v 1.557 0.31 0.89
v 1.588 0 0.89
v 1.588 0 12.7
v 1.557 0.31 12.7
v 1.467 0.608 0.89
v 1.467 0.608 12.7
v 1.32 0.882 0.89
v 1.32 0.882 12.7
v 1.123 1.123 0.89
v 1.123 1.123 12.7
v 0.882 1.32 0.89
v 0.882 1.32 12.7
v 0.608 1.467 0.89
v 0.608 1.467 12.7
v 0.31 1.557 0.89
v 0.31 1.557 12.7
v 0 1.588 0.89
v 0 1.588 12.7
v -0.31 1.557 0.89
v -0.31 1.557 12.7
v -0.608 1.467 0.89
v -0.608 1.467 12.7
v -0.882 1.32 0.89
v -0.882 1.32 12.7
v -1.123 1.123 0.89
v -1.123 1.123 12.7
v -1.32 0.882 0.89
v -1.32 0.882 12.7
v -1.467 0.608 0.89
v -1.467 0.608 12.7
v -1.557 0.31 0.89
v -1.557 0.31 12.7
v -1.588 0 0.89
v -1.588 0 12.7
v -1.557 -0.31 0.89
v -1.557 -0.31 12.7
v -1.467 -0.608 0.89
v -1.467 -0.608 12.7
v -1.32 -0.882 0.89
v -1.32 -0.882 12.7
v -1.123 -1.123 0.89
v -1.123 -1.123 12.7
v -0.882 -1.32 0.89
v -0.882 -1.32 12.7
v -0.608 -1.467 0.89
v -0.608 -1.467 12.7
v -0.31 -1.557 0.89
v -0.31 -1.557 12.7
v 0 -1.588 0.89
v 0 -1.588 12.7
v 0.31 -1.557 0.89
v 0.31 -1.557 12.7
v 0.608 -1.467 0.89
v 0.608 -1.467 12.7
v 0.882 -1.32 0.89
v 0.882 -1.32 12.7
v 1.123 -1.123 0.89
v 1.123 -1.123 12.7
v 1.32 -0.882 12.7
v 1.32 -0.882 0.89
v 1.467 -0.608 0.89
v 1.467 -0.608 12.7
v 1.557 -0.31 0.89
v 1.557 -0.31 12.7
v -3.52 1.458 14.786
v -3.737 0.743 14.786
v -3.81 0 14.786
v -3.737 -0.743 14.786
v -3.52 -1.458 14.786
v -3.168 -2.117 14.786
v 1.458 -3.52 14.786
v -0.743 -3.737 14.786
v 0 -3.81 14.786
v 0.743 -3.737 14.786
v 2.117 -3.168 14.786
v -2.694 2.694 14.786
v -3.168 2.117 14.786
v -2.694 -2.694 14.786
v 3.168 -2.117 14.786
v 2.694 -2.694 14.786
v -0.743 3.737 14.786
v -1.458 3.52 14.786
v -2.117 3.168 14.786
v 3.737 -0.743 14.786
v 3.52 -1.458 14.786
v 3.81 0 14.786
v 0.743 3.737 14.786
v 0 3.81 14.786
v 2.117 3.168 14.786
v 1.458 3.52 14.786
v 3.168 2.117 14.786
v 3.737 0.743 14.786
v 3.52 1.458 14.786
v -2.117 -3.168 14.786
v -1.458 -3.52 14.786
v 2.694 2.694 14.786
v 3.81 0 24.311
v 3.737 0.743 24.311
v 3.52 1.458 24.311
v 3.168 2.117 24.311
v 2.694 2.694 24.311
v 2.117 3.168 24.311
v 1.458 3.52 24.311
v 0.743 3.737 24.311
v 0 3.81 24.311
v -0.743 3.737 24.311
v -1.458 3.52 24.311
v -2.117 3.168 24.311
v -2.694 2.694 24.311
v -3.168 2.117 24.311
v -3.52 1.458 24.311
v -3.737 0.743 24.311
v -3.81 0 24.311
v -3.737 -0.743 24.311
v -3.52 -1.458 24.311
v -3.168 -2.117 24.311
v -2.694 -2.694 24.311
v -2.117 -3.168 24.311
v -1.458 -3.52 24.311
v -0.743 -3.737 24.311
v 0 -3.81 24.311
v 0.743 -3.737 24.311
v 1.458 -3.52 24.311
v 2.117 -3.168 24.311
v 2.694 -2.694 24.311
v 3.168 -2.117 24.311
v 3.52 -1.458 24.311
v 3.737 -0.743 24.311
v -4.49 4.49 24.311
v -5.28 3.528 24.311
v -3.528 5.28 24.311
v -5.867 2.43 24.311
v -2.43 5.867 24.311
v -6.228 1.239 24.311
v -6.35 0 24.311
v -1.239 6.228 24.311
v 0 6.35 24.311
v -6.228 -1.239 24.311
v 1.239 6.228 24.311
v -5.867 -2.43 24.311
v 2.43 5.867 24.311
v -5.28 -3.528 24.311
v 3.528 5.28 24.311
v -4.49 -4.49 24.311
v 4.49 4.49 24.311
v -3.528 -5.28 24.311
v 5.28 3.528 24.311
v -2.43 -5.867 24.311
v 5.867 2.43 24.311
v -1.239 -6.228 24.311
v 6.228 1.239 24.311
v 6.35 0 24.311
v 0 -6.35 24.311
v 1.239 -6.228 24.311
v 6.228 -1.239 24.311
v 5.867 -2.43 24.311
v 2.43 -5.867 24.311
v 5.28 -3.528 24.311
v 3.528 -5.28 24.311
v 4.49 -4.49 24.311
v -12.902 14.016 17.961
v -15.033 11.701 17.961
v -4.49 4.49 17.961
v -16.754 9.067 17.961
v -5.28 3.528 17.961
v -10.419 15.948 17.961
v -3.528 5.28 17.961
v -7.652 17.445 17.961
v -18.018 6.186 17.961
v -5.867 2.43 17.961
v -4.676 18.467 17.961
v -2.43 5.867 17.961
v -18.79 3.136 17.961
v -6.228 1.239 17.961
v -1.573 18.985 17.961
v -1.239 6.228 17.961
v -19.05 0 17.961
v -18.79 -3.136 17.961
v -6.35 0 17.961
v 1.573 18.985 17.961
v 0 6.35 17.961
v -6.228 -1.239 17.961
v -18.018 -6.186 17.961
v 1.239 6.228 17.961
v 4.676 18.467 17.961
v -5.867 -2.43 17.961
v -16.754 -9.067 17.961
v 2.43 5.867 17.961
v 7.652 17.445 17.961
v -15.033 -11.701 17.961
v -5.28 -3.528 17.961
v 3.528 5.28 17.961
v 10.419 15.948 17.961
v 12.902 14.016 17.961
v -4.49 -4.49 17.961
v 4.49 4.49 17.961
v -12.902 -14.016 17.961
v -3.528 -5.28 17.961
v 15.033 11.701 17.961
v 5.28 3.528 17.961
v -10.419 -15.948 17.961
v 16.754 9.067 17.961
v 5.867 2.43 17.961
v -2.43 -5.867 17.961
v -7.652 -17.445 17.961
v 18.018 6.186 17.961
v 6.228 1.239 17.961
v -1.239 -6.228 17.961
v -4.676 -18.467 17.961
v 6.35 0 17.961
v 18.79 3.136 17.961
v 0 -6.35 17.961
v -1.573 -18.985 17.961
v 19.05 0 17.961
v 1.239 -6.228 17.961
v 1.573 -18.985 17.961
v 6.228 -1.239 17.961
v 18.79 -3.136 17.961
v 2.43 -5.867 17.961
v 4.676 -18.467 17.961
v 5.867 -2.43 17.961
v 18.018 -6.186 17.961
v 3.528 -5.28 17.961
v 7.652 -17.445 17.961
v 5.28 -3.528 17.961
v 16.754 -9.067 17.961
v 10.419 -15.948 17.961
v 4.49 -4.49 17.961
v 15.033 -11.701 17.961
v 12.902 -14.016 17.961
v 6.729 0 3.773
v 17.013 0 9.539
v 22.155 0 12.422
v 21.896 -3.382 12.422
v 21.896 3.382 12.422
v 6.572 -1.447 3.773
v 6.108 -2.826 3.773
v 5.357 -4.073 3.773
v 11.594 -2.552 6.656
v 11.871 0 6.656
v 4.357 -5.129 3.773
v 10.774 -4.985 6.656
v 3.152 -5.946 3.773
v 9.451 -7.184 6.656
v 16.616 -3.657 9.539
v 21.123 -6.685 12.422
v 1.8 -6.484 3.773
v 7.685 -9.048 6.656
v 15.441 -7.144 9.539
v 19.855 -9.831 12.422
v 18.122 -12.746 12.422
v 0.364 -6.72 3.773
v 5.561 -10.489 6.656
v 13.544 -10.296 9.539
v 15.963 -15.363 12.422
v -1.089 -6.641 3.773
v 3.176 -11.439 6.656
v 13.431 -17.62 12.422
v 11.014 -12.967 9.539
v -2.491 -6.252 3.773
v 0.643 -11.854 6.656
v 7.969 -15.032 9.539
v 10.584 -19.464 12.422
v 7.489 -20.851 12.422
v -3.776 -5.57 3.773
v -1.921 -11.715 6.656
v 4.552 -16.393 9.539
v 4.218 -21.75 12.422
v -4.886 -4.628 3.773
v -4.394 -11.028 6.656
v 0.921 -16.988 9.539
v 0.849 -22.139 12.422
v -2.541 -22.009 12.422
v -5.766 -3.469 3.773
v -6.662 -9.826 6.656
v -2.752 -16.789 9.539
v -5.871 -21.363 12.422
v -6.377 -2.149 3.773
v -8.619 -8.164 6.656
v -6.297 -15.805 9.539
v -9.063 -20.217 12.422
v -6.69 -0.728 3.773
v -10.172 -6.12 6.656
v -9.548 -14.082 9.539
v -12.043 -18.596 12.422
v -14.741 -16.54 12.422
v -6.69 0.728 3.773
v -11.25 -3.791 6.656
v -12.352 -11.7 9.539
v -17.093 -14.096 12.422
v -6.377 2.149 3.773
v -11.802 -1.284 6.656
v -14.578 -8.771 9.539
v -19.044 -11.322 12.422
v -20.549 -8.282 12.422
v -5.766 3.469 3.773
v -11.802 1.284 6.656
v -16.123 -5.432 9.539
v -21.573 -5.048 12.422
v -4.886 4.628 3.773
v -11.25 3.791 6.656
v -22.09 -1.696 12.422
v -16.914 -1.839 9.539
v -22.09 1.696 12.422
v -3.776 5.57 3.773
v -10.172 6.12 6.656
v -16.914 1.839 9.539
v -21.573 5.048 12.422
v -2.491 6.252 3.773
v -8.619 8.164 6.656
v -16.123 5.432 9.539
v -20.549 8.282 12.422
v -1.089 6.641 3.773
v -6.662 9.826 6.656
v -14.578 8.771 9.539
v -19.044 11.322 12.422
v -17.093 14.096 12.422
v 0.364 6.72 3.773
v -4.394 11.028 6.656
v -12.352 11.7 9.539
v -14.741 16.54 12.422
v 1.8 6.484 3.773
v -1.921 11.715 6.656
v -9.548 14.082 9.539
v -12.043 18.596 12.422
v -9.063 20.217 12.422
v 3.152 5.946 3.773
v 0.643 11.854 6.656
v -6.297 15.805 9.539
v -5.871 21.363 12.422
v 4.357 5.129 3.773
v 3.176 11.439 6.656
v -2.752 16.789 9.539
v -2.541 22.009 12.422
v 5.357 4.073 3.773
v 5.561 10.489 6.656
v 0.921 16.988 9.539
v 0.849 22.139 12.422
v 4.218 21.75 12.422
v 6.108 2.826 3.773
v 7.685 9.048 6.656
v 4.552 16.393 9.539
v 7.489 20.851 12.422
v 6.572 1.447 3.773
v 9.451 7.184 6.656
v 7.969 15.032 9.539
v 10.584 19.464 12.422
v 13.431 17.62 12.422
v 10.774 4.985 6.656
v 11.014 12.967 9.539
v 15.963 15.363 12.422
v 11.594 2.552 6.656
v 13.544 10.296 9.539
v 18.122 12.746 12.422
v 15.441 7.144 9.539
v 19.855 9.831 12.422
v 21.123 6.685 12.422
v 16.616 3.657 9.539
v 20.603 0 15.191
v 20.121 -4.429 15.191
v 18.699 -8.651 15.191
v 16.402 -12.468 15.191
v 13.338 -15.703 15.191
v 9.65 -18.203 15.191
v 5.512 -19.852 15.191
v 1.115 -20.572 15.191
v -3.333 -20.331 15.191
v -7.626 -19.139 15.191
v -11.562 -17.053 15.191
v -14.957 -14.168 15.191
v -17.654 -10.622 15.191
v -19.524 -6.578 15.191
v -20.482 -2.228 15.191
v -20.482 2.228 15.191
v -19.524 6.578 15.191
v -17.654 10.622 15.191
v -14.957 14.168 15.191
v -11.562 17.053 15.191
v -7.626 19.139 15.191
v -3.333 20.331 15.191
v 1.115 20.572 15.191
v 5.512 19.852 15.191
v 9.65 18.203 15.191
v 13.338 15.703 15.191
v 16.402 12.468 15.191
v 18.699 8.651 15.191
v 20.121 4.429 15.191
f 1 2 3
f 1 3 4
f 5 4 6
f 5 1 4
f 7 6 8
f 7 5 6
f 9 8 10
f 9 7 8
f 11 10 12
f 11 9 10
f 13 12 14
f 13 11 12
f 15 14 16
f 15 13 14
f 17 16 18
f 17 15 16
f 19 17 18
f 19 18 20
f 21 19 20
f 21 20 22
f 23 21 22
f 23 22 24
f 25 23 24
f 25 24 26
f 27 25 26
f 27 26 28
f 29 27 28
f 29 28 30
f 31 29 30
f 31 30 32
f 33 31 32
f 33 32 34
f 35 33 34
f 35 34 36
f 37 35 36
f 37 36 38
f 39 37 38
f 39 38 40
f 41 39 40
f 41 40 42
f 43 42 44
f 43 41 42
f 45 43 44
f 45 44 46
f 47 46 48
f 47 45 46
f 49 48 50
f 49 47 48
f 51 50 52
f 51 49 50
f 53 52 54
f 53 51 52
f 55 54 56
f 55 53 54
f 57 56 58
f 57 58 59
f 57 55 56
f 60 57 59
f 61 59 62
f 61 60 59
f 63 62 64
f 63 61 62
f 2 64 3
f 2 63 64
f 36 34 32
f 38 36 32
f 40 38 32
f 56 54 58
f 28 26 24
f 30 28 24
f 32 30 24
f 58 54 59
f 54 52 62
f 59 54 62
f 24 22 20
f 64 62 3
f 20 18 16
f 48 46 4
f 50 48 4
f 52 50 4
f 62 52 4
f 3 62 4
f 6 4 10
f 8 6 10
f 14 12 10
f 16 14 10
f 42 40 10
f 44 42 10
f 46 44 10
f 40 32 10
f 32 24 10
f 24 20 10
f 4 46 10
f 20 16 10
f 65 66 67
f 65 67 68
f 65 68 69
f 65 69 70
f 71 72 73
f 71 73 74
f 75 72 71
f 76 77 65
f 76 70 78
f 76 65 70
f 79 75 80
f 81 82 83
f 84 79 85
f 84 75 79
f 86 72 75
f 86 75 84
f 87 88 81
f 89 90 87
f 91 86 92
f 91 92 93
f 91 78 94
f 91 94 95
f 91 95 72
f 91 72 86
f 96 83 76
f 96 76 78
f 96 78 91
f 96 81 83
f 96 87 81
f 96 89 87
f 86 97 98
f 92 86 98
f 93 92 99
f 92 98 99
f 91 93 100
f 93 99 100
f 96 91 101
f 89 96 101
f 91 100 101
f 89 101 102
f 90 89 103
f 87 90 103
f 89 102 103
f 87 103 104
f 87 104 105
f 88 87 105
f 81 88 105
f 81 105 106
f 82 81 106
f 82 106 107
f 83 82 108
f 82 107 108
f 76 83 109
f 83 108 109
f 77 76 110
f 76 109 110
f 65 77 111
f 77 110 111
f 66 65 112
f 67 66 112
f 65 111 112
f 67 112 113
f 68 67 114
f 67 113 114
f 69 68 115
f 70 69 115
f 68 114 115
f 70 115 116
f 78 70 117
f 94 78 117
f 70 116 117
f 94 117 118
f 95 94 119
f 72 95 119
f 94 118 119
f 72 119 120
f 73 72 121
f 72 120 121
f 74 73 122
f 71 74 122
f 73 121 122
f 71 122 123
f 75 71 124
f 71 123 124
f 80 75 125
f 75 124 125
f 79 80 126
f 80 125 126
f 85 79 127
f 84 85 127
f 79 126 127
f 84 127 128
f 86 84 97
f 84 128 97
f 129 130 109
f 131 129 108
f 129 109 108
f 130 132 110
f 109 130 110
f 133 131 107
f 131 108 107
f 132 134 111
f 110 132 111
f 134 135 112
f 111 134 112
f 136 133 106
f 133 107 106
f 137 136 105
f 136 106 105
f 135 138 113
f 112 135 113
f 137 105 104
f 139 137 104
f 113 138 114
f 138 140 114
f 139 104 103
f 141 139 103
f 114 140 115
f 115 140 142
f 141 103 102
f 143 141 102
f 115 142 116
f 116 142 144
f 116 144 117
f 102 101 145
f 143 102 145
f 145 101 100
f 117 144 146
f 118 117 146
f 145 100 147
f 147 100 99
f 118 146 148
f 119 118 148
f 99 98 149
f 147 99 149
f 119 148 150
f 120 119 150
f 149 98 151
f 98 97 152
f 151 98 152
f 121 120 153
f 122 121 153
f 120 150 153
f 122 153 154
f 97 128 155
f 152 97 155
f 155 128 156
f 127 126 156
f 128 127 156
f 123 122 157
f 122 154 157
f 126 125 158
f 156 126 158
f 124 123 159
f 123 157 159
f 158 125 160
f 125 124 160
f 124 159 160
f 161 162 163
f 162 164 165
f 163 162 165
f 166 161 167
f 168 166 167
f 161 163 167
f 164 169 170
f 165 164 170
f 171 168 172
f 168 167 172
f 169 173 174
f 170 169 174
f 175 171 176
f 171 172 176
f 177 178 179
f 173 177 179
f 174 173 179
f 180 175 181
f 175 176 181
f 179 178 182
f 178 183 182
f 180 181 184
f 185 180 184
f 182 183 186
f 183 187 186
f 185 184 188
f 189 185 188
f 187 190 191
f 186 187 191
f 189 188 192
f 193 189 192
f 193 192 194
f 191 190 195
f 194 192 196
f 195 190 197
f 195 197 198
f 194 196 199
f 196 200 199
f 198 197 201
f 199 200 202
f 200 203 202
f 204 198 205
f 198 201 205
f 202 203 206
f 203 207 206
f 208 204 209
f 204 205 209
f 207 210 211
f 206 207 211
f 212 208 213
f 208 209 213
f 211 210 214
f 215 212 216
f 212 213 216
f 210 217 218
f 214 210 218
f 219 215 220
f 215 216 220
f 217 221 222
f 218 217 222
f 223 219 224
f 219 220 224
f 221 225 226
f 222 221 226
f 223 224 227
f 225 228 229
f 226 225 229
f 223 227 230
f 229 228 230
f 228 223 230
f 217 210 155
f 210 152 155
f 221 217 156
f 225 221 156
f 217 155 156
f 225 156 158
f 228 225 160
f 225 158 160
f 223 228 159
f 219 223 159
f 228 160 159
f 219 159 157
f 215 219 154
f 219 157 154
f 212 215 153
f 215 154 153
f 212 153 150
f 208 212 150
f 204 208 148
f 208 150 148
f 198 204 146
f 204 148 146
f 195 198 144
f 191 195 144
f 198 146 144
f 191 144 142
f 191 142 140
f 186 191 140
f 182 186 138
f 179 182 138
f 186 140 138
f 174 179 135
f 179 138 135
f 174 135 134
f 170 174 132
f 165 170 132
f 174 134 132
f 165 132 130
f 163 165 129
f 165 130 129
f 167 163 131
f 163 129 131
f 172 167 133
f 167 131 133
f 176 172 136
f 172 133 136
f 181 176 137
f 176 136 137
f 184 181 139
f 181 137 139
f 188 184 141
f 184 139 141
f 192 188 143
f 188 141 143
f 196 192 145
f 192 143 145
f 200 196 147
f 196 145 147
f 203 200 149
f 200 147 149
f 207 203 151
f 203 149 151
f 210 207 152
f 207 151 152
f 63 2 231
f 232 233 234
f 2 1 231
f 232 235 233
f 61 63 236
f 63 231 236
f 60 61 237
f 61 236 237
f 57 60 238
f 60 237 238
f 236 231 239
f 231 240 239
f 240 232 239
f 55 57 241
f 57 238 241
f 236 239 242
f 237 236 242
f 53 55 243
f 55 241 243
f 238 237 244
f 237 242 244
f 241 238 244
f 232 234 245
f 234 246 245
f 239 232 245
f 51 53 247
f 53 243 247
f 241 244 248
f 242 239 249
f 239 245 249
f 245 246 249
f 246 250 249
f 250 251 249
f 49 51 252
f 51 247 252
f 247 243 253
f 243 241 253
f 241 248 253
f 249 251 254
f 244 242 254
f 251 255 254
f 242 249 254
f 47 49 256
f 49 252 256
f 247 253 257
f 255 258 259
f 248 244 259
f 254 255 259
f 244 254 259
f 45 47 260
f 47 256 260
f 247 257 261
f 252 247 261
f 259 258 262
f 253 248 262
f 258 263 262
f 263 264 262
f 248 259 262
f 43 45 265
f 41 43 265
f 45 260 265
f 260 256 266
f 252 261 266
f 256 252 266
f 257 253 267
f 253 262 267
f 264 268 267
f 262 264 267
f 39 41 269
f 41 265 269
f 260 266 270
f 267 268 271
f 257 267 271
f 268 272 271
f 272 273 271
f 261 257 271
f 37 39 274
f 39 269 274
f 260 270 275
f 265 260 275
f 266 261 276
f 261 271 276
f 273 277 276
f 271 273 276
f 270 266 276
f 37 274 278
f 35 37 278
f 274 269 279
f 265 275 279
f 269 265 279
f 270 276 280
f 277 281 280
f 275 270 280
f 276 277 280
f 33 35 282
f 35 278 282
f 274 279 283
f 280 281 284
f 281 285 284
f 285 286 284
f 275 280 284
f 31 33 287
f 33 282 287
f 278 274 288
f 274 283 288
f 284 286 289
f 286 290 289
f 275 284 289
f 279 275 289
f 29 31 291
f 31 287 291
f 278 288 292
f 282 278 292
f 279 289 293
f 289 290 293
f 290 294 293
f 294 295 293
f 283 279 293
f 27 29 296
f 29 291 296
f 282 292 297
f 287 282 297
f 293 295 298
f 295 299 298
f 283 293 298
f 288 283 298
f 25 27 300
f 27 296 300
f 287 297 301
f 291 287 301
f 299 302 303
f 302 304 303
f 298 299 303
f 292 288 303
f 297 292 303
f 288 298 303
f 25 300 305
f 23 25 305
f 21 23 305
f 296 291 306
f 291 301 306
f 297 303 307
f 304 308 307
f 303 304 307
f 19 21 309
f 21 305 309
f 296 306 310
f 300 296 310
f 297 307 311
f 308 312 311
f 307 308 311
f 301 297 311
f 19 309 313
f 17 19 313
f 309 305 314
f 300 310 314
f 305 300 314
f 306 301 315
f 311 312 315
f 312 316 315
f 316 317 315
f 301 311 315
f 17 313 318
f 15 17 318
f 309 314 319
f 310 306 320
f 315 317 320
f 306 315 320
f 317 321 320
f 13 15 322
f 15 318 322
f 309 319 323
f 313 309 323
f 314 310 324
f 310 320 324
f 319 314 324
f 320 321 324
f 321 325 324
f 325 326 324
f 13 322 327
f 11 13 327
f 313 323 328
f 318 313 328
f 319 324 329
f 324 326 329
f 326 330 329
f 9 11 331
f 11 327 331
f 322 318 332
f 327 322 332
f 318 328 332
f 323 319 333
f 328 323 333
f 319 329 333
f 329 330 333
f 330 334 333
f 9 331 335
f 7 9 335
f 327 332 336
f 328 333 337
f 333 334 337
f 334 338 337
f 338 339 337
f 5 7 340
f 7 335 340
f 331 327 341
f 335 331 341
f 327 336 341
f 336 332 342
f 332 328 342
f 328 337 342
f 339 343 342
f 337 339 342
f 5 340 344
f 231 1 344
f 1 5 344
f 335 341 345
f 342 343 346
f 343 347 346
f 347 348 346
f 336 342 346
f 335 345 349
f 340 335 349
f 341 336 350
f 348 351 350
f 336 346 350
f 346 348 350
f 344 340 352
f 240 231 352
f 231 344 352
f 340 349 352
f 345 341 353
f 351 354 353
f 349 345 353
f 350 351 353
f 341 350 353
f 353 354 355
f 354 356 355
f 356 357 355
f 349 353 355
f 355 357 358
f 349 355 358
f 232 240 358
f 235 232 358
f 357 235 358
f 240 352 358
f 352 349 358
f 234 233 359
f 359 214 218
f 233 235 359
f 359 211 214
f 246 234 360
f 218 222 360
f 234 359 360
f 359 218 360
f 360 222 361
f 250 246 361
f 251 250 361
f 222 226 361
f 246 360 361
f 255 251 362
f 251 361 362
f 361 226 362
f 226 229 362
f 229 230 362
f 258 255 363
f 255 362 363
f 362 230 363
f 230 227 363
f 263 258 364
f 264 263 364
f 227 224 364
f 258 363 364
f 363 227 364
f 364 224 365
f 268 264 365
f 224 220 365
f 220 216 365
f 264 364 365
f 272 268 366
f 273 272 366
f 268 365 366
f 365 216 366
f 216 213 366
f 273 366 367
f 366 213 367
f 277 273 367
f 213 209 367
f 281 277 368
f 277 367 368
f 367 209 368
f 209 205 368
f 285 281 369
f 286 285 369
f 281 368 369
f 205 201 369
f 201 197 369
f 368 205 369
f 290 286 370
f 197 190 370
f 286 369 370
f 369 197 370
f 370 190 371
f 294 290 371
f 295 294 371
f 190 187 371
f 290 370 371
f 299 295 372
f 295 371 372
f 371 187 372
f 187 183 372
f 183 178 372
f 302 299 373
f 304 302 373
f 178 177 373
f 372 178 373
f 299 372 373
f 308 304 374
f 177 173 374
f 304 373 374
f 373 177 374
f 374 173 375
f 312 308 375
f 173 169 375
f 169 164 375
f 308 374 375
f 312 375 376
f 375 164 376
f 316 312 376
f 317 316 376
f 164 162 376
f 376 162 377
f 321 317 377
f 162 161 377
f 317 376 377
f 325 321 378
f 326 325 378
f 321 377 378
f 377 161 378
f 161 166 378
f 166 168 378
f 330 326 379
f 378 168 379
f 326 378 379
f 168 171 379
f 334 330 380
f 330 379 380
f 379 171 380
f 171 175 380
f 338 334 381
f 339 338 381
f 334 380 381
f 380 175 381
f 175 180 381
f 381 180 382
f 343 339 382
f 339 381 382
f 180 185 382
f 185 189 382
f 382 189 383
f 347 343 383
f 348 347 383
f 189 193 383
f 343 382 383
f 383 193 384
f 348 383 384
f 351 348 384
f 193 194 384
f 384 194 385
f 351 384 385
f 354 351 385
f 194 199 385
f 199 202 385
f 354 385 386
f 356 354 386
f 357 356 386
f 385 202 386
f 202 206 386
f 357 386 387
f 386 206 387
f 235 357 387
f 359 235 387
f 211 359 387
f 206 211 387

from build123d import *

# Parameters (mm, degrees)
F2_R     = 3.81
F3_DEPTH = 9.525
F4_R     = 1.5875
F5_DEPTH = 12.7


with BuildPart() as f1:
    # F0 (on Front) → F1 (revolve)
    with BuildSketch(Plane.XZ):
        Polygon((0, 24.310512), (0, 0), (22.155415, 12.421659), (19.05, 17.960512), (6.35, 17.960512), (6.35, 24.310512), align=None)
    revolve(axis=Axis((0, 0, 12.155256), (0, 0, -1)))

    # F2 (on face) → F3 (cut)
    with BuildSketch(Plane.XY.offset(24.310512)):
        Circle(F2_R)
    extrude(amount=-F3_DEPTH, mode=Mode.SUBTRACT)

    # F4 (on Top) → F5 (cut)
    with BuildSketch(Plane.XY):
        Circle(F4_R)
    extrude(amount=F5_DEPTH, mode=Mode.SUBTRACT)


solid = f1.part
